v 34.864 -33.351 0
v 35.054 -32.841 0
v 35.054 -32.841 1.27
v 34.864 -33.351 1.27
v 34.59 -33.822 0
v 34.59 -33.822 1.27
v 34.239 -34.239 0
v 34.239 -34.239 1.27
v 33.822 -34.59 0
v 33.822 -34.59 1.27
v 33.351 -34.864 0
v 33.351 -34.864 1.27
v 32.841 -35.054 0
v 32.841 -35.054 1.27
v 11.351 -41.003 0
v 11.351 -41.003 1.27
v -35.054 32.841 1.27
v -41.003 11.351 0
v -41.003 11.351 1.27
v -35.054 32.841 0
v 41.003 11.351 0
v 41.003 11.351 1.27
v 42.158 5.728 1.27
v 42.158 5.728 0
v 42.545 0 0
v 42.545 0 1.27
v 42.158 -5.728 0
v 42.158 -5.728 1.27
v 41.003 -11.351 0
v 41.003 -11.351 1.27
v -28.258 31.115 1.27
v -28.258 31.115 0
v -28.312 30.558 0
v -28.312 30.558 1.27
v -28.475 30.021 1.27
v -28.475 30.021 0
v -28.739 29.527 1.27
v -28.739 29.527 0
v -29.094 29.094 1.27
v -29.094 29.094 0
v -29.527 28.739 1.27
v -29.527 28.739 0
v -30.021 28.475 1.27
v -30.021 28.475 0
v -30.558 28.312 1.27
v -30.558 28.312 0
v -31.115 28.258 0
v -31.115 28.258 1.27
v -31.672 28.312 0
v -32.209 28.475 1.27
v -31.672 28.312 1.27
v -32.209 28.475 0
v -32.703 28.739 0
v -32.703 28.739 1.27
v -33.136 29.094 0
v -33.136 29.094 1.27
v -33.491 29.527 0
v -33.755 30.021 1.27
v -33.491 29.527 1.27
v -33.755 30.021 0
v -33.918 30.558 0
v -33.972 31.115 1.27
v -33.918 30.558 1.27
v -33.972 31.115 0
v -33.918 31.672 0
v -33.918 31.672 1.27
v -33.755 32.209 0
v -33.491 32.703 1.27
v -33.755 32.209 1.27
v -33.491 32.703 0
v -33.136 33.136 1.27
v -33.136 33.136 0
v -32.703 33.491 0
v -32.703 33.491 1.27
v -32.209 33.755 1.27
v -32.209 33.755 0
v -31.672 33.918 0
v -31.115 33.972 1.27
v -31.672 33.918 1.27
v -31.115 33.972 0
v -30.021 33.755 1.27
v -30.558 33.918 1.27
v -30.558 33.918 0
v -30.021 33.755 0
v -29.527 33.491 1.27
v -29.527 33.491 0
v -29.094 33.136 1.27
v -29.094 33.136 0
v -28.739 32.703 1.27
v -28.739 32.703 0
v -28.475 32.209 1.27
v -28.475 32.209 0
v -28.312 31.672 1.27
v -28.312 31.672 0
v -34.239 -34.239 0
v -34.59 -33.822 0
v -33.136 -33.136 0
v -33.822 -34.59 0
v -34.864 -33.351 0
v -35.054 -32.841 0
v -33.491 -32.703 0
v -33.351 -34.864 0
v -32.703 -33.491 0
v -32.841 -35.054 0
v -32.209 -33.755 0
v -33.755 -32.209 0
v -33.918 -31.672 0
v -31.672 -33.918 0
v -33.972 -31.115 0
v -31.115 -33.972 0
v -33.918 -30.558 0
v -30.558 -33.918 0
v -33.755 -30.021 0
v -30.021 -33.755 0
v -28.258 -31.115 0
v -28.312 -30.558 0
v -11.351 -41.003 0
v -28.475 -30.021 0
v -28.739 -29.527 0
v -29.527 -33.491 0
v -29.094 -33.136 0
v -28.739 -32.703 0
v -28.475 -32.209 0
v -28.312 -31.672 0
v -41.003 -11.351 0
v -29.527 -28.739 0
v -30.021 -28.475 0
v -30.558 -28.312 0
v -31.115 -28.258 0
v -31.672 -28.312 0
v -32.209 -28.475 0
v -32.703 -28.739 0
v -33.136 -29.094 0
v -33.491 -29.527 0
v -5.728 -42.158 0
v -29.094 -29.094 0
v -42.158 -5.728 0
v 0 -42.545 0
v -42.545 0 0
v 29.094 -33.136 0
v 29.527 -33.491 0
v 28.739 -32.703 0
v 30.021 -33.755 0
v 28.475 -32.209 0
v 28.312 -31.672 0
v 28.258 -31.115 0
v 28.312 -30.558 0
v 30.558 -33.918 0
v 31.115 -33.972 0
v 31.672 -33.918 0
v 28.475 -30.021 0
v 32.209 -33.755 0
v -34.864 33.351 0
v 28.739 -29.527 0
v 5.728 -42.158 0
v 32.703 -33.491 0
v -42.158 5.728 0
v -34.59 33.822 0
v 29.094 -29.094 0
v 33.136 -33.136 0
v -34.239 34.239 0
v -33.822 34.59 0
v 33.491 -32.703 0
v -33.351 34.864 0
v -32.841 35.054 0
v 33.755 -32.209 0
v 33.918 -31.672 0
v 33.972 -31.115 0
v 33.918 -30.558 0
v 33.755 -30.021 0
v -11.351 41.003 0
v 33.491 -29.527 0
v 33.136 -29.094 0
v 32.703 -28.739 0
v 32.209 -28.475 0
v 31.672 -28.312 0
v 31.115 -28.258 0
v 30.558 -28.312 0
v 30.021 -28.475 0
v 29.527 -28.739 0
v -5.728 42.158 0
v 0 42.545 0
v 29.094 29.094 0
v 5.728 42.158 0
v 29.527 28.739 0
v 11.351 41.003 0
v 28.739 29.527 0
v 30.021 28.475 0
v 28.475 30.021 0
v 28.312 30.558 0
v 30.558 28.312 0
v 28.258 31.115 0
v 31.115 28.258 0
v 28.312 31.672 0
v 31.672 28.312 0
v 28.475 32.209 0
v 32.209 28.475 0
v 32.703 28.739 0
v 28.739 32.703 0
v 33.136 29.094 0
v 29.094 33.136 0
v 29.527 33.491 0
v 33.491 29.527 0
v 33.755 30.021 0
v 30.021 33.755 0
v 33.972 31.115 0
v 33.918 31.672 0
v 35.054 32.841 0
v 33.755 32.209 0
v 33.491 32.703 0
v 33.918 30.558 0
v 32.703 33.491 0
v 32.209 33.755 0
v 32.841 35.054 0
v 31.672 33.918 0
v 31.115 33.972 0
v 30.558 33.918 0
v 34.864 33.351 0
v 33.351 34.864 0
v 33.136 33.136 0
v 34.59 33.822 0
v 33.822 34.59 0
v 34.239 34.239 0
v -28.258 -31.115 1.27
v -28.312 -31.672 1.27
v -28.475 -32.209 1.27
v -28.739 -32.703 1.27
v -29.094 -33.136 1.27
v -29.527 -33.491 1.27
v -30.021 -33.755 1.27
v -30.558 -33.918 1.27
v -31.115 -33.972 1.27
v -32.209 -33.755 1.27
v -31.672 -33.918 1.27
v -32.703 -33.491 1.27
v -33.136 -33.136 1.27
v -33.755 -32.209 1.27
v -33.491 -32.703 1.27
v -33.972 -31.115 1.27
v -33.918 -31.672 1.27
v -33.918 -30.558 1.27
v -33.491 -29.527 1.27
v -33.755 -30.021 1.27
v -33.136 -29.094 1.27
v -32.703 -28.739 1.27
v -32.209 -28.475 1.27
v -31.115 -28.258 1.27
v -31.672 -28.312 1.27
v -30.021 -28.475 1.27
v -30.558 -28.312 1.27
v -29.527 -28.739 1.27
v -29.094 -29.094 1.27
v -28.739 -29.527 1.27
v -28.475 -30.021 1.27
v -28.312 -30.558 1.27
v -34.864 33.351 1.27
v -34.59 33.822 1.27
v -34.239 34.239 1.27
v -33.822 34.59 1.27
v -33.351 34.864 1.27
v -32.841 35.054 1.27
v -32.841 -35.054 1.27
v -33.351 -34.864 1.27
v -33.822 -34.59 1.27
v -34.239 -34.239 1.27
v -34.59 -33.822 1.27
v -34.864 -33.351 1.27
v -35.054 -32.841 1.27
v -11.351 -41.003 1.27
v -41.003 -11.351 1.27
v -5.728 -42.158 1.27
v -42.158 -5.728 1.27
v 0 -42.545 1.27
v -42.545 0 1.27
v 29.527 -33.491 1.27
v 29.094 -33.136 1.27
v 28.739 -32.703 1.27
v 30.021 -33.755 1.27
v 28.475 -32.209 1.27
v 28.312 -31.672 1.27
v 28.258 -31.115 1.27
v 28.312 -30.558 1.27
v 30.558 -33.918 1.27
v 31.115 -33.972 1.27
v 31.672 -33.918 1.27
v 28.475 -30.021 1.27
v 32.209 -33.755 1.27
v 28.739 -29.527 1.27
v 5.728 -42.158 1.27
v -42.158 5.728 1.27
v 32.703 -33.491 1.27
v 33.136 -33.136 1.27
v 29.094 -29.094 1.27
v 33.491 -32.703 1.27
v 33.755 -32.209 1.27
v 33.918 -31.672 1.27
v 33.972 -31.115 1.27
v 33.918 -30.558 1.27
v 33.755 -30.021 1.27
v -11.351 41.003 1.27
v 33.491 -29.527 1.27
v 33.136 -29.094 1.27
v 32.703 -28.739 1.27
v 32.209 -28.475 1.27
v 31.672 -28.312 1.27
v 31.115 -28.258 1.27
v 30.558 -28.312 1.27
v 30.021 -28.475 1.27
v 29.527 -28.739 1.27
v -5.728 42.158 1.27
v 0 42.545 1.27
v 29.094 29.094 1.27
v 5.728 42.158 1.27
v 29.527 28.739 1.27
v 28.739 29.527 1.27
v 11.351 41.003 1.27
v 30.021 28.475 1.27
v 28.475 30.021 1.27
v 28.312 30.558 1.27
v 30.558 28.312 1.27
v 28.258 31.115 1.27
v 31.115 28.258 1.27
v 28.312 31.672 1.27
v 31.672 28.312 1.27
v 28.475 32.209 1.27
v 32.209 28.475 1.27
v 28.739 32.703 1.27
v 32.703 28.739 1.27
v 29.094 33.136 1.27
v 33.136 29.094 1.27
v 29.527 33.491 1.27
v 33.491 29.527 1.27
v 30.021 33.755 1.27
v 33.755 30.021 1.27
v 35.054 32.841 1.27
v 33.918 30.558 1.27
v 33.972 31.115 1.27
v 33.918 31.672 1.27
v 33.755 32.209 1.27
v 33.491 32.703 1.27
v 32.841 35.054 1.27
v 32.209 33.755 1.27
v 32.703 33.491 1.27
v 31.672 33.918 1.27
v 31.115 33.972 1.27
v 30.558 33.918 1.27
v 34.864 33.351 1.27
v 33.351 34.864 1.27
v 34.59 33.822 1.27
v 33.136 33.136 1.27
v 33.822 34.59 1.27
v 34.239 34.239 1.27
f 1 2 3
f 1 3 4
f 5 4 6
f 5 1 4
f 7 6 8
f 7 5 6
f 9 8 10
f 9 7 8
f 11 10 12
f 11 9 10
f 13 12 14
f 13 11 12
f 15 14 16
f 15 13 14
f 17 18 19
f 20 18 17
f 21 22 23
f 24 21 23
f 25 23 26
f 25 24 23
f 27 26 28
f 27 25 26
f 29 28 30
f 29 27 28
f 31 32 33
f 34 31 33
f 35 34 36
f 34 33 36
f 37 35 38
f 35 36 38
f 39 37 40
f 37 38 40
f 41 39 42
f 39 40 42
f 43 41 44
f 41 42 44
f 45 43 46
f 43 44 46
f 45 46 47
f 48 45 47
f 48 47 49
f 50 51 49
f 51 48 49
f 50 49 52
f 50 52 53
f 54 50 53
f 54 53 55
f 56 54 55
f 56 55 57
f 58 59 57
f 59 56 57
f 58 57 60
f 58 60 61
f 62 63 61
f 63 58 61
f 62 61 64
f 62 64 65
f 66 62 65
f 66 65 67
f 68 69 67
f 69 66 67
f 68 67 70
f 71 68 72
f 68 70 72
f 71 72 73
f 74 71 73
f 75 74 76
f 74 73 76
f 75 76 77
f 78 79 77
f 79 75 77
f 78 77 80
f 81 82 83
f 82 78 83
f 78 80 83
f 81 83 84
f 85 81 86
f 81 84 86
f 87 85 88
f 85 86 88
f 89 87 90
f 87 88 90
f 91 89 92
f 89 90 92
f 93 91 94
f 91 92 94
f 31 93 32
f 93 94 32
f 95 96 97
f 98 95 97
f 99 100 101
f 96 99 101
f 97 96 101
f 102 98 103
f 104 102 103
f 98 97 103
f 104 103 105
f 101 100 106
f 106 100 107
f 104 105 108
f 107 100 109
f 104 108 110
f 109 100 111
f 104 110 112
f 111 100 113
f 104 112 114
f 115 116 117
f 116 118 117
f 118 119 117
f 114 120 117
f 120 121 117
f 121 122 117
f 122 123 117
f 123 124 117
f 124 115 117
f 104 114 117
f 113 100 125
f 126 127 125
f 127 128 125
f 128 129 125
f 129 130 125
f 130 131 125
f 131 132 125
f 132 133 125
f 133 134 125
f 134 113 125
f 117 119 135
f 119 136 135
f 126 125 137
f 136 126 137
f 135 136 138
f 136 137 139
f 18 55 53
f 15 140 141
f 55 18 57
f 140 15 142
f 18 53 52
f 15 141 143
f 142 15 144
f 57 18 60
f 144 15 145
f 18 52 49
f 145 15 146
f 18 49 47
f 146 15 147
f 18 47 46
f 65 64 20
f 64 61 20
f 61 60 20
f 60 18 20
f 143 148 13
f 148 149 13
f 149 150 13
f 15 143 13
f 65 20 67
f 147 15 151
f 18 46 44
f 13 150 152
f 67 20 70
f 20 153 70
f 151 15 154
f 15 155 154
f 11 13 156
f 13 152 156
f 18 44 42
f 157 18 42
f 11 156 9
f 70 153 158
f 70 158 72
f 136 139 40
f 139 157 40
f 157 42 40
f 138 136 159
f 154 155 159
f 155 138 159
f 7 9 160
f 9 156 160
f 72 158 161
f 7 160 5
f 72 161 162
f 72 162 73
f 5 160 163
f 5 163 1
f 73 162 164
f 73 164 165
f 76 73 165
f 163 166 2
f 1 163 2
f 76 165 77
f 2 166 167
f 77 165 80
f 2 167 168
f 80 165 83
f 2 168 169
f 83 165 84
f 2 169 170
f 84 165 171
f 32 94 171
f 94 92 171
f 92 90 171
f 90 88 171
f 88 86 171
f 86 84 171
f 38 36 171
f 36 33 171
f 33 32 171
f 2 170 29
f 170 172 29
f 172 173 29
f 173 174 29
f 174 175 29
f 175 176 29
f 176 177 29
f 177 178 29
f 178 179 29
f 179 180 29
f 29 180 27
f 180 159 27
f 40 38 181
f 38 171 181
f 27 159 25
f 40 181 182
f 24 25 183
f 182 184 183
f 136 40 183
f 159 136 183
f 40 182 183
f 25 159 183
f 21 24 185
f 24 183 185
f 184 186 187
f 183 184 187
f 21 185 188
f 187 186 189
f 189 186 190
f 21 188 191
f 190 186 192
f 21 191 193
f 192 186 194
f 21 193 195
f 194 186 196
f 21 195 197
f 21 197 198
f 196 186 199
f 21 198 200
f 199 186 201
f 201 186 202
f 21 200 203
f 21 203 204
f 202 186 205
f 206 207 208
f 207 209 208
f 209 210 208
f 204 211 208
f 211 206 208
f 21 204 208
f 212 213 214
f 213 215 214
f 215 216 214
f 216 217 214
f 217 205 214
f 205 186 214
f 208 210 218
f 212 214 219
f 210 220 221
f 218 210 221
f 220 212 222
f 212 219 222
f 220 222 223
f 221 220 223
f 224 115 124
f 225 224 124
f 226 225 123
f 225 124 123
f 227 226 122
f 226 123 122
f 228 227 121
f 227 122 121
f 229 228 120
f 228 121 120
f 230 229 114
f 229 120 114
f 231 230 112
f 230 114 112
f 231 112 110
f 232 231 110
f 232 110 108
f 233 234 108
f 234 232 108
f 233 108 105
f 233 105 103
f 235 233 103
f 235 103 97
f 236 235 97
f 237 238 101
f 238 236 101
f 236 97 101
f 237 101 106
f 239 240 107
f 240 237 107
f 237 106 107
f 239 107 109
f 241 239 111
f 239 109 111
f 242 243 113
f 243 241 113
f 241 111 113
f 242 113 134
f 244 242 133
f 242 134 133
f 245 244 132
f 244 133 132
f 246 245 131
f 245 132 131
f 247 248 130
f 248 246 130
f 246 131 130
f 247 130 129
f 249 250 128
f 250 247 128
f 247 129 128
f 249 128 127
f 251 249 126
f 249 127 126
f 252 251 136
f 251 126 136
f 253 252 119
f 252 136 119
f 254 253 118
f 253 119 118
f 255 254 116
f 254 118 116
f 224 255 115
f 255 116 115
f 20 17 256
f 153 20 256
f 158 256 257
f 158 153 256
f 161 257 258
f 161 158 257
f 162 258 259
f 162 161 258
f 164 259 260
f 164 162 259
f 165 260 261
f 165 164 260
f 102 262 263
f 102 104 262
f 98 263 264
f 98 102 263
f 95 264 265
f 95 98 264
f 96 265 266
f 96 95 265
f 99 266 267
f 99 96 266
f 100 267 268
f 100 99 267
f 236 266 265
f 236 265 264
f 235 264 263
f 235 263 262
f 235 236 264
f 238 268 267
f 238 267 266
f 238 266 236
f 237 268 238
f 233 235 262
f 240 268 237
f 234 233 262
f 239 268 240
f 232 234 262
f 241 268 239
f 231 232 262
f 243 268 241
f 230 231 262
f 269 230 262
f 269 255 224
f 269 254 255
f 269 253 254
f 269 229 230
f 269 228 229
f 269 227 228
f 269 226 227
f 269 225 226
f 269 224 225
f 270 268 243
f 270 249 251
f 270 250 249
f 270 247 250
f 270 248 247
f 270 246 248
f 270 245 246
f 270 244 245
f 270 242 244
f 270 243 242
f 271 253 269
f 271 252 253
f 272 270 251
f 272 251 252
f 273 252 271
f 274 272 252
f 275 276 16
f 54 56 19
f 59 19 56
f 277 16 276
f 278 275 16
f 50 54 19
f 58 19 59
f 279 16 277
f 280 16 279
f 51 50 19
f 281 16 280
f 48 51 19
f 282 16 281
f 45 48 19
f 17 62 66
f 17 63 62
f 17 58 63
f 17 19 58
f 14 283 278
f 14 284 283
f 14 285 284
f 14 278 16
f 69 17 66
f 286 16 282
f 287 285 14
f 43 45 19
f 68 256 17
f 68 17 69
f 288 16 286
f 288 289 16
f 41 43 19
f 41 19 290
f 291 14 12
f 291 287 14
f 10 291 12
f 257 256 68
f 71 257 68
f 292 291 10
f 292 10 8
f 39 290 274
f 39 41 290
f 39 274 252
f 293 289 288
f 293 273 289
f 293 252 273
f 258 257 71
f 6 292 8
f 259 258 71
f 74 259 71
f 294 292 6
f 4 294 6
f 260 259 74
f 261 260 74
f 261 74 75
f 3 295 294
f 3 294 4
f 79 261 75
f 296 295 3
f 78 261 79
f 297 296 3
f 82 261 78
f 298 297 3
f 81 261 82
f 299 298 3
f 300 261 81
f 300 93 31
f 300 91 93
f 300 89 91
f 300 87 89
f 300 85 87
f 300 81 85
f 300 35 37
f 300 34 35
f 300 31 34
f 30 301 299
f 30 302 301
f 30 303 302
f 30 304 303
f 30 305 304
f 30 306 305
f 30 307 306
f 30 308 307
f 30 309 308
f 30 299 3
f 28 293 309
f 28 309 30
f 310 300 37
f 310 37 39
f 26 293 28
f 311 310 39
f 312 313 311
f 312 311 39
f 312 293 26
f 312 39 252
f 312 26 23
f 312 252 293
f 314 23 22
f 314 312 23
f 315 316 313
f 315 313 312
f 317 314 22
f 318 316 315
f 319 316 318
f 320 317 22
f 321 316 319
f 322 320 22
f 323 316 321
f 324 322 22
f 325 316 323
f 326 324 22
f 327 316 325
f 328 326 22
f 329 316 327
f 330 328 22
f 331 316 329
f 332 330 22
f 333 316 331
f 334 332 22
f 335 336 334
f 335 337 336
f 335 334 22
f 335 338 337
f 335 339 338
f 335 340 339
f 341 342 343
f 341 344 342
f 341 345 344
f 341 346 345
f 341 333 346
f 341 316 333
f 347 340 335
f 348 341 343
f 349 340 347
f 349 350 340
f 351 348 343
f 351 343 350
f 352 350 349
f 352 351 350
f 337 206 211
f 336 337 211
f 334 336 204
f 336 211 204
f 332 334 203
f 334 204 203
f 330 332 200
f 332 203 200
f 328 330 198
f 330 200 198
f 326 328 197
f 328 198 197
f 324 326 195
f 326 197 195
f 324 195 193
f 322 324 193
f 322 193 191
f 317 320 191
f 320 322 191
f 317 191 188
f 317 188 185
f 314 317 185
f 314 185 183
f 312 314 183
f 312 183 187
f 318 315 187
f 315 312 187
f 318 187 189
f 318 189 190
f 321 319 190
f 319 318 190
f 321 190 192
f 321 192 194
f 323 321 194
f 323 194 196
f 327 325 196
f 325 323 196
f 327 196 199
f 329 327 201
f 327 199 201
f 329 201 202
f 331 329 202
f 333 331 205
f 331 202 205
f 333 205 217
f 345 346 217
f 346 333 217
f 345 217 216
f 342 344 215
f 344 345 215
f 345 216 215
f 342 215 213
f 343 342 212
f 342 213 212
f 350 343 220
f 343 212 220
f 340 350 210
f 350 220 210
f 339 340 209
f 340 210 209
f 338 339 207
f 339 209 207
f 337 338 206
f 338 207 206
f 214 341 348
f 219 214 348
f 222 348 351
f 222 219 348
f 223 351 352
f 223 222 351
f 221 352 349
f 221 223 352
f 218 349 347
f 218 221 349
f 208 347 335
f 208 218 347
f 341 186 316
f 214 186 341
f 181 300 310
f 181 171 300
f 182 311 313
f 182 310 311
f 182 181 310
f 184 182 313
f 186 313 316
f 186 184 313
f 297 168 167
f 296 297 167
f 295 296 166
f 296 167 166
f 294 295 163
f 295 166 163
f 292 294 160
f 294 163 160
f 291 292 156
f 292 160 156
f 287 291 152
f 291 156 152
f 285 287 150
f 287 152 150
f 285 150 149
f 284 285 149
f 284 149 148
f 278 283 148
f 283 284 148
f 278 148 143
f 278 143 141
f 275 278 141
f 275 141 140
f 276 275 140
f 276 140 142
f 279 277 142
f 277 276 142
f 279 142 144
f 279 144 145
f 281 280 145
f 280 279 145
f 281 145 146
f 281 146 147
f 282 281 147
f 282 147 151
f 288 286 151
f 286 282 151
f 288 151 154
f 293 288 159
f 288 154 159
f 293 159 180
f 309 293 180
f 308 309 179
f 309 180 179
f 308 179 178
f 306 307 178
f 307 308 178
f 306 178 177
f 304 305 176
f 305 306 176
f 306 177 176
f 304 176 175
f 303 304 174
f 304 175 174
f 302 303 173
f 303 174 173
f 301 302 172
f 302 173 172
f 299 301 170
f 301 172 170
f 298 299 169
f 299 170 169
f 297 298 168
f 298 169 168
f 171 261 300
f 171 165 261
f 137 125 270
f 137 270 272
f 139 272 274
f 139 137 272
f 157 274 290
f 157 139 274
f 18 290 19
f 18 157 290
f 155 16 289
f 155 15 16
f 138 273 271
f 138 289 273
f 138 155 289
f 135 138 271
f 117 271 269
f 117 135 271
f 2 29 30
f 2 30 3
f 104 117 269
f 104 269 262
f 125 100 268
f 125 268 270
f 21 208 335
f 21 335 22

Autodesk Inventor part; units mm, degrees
ref_plane "YZ Plane" through (0, 0, 0) normal (1, 0, 0) x (0, 1, 0)
ref_plane "XZ Plane" through (0, 0, 0) normal (0, 1, 0) x (-1, 0, 0)
ref_plane "XY Plane" through (0, 0, 0) normal (0, 0, 1) x (1, 0, 0)
sketch "Sketch1" plane through (0, 0, 0) normal (0, 0, 1) x (1, 0, 0)
  circle A0 centre (31.115, 31.115) radius 2.8575
  line L0 (35.0538, 32.8409) -> (41.0029, 11.3509)
  arc A1 (35.0538, 32.8409) -> (32.8409, 35.0538) centre (31.9938, 31.9938) ccw
  line L1 (11.3509, 41.0029) -> (32.8409, 35.0538)
  arc A2 (41.0029, -11.3509) -> (41.0029, 11.3509) centre (0, 0) ccw
  line L2 (41.0029, -11.3509) -> (35.0538, -32.8409)
  line L3 (32.8409, -35.0538) -> (11.3509, -41.0029)
  arc A3 (32.8409, -35.0538) -> (35.0538, -32.8409) centre (31.9938, -31.9938) ccw
  arc A4 (-11.3509, -41.0029) -> (11.3509, -41.0029) centre (0, 0) ccw
  line L4 (-11.3509, -41.0029) -> (-32.8409, -35.0538)
  arc A5 (-35.0538, -32.8409) -> (-32.8409, -35.0538) centre (-31.9938, -31.9938) ccw
  line L5 (-35.0538, -32.8409) -> (-41.0029, -11.3509)
  arc A6 (-41.0029, 11.3509) -> (-41.0029, -11.3509) centre (0, 0) ccw
  line L6 (-41.0029, 11.3509) -> (-35.0538, 32.8409)
  arc A7 (-32.8409, 35.0538) -> (-35.0538, 32.8409) centre (-31.9938, 31.9938) ccw
  line L7 (-32.8409, 35.0538) -> (-11.3509, 41.0029)
  circle A8 centre (-31.115, 31.115) radius 2.8575
  circle A9 centre (-31.115, 31.115) radius 1.5875
  circle A10 centre (31.115, 31.115) radius 1.5875
  circle A11 centre (31.115, -31.115) radius 2.8575
  circle A12 centre (31.115, -31.115) radius 1.5875
  circle A13 centre (-31.115, -31.115) radius 2.8575
  circle A14 centre (-31.115, -31.115) radius 1.5875
  arc A15 (11.3509, 41.0029) -> (-11.3509, 41.0029) centre (0, 0) ccw
  point P0 (0, 0)
extrude "Extrusion1" add sketch "Sketch1" along normal blind 1.27 contours L0 A2 L2 A3 L3 A4 L4 A5 L5 A6 L6 A7 L7 A15 L1 A1
properties part number "Back Plate 1764"
